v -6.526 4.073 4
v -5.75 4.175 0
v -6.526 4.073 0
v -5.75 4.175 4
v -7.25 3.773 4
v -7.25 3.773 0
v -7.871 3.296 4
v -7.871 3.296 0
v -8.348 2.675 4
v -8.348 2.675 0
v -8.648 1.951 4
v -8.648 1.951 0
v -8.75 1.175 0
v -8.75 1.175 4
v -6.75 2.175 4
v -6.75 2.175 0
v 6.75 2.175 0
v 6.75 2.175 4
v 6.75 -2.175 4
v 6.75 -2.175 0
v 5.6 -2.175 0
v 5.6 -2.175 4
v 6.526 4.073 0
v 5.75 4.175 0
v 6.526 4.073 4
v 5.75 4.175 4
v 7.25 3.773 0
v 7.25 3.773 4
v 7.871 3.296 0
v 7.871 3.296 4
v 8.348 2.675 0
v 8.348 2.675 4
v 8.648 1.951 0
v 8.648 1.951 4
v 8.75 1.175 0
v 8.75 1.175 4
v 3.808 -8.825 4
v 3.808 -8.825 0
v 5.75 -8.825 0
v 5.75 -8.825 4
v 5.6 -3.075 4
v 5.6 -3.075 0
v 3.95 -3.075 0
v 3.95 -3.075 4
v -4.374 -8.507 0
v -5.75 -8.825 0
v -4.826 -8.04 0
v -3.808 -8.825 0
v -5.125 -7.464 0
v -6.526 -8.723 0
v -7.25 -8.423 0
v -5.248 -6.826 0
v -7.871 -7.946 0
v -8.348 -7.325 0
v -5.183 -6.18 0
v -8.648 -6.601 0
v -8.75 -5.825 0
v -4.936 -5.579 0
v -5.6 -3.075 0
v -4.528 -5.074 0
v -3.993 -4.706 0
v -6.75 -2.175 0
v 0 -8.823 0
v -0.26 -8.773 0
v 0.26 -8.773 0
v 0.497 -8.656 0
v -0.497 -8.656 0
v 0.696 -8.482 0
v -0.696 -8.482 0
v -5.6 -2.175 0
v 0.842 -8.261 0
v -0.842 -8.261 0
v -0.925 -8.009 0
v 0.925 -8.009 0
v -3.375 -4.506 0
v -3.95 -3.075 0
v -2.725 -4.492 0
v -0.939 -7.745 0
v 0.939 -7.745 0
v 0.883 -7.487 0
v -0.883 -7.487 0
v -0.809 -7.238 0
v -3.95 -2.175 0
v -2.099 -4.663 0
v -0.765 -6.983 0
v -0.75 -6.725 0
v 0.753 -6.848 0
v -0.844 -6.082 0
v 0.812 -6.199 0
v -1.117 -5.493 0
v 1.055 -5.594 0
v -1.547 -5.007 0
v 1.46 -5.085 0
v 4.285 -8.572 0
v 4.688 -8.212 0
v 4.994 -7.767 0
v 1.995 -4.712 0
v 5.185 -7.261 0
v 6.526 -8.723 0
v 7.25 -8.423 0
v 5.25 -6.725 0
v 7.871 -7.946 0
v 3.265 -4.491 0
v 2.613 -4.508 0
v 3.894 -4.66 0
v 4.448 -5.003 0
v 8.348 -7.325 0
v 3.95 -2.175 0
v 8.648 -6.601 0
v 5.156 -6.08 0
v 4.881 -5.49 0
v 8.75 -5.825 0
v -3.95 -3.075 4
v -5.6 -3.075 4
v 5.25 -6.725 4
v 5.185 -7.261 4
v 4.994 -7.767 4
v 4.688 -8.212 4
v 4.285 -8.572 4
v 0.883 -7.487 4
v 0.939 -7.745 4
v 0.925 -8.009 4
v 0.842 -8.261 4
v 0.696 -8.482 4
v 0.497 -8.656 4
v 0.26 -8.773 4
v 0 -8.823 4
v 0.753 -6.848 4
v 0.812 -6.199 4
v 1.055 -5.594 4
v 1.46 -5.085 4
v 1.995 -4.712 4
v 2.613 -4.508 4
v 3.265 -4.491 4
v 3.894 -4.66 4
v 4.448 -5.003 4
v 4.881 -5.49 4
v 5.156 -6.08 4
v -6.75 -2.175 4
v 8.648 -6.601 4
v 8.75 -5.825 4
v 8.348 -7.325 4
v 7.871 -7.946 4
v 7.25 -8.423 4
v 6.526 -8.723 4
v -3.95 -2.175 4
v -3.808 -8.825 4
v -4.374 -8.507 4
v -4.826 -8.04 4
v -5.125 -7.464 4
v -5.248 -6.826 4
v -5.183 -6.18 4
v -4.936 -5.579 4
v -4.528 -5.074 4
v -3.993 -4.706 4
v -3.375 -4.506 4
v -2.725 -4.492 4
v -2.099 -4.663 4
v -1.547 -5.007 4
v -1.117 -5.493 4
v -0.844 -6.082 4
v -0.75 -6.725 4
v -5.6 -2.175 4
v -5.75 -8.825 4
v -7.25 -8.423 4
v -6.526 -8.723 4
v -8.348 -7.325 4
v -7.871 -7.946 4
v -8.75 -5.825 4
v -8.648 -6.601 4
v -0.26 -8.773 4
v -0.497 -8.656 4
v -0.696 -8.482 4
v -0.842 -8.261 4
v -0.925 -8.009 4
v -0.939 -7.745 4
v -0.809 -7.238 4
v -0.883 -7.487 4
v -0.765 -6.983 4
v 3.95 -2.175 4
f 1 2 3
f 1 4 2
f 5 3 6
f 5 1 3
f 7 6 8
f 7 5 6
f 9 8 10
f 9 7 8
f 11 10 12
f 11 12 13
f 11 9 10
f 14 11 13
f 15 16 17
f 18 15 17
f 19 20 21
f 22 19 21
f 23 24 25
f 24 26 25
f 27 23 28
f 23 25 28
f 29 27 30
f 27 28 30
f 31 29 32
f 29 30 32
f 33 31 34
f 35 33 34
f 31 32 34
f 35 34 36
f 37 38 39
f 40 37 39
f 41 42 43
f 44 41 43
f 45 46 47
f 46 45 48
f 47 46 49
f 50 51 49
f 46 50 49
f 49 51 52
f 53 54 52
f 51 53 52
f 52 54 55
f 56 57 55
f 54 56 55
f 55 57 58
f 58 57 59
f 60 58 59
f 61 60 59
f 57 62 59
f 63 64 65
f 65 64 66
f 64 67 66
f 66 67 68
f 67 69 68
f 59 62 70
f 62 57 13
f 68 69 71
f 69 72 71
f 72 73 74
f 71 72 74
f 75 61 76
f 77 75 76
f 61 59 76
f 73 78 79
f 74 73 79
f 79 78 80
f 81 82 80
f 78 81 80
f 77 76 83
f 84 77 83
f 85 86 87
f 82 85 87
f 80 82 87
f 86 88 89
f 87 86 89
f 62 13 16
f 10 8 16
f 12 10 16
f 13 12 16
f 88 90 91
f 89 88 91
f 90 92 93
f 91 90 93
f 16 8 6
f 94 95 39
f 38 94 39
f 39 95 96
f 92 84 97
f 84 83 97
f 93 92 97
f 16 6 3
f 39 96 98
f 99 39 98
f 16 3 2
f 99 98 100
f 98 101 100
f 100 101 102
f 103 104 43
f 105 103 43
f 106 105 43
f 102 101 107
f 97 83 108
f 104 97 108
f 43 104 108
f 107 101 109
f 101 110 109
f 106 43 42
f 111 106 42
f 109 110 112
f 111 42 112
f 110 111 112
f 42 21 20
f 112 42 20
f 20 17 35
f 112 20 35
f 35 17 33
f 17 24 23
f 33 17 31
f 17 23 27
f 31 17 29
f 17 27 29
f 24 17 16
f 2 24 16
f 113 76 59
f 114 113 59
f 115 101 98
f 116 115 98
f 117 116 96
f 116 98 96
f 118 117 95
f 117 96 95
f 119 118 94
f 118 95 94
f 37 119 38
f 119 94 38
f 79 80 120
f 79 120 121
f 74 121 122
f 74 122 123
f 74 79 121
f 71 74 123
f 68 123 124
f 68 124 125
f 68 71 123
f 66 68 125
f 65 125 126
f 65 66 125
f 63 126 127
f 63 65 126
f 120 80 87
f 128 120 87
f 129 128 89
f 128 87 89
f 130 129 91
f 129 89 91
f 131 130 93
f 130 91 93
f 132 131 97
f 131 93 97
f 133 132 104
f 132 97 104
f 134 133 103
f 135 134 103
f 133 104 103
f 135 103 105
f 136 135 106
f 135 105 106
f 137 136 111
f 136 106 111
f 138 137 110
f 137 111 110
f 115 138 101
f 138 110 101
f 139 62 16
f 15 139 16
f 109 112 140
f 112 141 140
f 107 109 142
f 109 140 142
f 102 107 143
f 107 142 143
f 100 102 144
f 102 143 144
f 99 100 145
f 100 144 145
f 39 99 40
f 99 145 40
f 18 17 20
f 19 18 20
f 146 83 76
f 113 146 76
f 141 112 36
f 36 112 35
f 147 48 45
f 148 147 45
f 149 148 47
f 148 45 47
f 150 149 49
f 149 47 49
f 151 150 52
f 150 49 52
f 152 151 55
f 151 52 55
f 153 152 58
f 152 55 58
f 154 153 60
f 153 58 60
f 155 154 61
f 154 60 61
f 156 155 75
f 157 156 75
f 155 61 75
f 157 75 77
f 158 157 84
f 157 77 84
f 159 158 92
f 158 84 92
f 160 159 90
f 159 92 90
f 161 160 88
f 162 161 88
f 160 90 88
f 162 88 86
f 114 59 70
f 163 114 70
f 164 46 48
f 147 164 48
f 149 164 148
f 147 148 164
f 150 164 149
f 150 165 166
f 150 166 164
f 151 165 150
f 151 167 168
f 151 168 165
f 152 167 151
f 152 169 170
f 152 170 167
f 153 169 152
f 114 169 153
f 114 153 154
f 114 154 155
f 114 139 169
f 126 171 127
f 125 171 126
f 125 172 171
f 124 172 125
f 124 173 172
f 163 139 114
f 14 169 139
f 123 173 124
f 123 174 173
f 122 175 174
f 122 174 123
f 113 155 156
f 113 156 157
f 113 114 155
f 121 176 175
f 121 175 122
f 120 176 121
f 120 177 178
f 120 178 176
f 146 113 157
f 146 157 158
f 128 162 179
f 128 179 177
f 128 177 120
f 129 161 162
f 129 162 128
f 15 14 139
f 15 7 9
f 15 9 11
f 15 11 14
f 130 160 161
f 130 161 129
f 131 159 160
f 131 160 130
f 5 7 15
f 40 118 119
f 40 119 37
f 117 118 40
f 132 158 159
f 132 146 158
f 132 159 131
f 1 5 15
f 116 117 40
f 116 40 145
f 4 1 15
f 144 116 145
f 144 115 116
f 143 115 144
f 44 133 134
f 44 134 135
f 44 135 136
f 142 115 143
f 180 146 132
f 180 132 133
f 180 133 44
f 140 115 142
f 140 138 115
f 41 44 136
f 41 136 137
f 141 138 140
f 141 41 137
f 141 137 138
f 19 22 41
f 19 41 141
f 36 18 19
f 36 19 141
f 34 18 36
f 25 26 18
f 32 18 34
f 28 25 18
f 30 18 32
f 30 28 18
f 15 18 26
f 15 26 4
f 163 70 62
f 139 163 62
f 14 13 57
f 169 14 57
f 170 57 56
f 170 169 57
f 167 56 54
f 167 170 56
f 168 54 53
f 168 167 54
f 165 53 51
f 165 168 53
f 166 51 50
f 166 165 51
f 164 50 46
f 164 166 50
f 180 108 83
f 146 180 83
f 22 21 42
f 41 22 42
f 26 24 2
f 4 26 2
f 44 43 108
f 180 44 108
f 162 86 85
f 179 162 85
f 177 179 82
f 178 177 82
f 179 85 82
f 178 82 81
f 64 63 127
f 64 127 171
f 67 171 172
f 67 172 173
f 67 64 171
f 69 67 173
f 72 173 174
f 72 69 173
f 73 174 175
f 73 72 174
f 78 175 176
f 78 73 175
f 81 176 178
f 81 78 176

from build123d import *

# Parameters (mm, degrees)
F1_DEPTH    = 4
F2_R        = 3
F3_T1_DEPTH = 15.252055078


# Not quite as in the source:
# - a fillet or chamfer that OpenCascade refuses, or shapes differently, is made with other operations: its cross-section is extruded or revolved along the edge and cut away or added


with BuildPart() as f1:
    # F0 (on Top) → F1 (new body)
    with BuildSketch(Plane.XY):
        with BuildLine():
            Line((8.75, 4.175), (-8.75, 4.175))
            Line((-8.75, 4.175), (-8.75, -8.825))
            Line((-8.75, -8.825), (-3.8077747211, -8.825))
            ThreePointArc((-3.8077747211, -8.825), (-4.2737752701, -4.8702772279), (-0.75, -6.725))
            ThreePointArc((-0.75, -6.725), (-1.1452772279, -7.9987752701), (-2.1922252789, -8.825))
            Line((-2.1922252789, -8.825), (2.1922252789, -8.825))
            ThreePointArc((2.1922252789, -8.825), (1.7262247299, -4.8702772279), (5.25, -6.725))
            ThreePointArc((5.25, -6.725), (4.8547227721, -7.9987752701), (3.8077747211, -8.825))
            Line((3.8077747211, -8.825), (8.75, -8.825))
            Line((8.75, -8.825), (8.75, 4.175))
        make_face()
        Polygon((-6.75, 2.175), (6.75, 2.175), (6.75, -2.175), (5.6, -2.175), (5.6, -3.075), (3.95, -3.075), (3.95, -2.175), (-3.95, -2.175), (-3.95, -3.075), (-5.6, -3.075), (-5.6, -2.175), (-6.75, -2.175), align=None, mode=Mode.SUBTRACT)
    extrude(amount=F1_DEPTH)

    # F2
    f2_edges = [f1.edges().sort_by_distance(p)[0] for p in [
        (-8.75, 4.175, 2),
        (-8.75, -8.825, 2),
        (8.75, -8.825, 2),
        (8.75, 4.175, 2),
    ]]
    fillet(f2_edges, radius=F2_R)

    # F3: fillet of radius 1 on 2 edges, made by hand

    # F3_s2 → F3_t1 (cut)
    with BuildSketch(Plane.XY.offset(-5.626027539)):
        with BuildLine():
            ThreePointArc((0.88279449, -7.4865384615), (0.7598795231, -8.4001254044), (-0.0581857367, -8.825))
            Line((-0.0581857367, -8.825), (2.1922252789, -8.825))
            ThreePointArc((2.1922252789, -8.825), (1.3916632316, -8.2984525222), (0.88279449, -7.4865384615))
        make_face()
        with BuildLine():
            ThreePointArc((0.0581857367, -8.825), (-0.7598795231, -8.4001254044), (-0.88279449, -7.4865384615))
            ThreePointArc((-0.88279449, -7.4865384615), (-1.3916632316, -8.2984525222), (-2.1922252789, -8.825))
            Line((-2.1922252789, -8.825), (0.0581857367, -8.825))
        make_face()
    extrude(amount=F3_T1_DEPTH, mode=Mode.SUBTRACT)


solid = f1.part
